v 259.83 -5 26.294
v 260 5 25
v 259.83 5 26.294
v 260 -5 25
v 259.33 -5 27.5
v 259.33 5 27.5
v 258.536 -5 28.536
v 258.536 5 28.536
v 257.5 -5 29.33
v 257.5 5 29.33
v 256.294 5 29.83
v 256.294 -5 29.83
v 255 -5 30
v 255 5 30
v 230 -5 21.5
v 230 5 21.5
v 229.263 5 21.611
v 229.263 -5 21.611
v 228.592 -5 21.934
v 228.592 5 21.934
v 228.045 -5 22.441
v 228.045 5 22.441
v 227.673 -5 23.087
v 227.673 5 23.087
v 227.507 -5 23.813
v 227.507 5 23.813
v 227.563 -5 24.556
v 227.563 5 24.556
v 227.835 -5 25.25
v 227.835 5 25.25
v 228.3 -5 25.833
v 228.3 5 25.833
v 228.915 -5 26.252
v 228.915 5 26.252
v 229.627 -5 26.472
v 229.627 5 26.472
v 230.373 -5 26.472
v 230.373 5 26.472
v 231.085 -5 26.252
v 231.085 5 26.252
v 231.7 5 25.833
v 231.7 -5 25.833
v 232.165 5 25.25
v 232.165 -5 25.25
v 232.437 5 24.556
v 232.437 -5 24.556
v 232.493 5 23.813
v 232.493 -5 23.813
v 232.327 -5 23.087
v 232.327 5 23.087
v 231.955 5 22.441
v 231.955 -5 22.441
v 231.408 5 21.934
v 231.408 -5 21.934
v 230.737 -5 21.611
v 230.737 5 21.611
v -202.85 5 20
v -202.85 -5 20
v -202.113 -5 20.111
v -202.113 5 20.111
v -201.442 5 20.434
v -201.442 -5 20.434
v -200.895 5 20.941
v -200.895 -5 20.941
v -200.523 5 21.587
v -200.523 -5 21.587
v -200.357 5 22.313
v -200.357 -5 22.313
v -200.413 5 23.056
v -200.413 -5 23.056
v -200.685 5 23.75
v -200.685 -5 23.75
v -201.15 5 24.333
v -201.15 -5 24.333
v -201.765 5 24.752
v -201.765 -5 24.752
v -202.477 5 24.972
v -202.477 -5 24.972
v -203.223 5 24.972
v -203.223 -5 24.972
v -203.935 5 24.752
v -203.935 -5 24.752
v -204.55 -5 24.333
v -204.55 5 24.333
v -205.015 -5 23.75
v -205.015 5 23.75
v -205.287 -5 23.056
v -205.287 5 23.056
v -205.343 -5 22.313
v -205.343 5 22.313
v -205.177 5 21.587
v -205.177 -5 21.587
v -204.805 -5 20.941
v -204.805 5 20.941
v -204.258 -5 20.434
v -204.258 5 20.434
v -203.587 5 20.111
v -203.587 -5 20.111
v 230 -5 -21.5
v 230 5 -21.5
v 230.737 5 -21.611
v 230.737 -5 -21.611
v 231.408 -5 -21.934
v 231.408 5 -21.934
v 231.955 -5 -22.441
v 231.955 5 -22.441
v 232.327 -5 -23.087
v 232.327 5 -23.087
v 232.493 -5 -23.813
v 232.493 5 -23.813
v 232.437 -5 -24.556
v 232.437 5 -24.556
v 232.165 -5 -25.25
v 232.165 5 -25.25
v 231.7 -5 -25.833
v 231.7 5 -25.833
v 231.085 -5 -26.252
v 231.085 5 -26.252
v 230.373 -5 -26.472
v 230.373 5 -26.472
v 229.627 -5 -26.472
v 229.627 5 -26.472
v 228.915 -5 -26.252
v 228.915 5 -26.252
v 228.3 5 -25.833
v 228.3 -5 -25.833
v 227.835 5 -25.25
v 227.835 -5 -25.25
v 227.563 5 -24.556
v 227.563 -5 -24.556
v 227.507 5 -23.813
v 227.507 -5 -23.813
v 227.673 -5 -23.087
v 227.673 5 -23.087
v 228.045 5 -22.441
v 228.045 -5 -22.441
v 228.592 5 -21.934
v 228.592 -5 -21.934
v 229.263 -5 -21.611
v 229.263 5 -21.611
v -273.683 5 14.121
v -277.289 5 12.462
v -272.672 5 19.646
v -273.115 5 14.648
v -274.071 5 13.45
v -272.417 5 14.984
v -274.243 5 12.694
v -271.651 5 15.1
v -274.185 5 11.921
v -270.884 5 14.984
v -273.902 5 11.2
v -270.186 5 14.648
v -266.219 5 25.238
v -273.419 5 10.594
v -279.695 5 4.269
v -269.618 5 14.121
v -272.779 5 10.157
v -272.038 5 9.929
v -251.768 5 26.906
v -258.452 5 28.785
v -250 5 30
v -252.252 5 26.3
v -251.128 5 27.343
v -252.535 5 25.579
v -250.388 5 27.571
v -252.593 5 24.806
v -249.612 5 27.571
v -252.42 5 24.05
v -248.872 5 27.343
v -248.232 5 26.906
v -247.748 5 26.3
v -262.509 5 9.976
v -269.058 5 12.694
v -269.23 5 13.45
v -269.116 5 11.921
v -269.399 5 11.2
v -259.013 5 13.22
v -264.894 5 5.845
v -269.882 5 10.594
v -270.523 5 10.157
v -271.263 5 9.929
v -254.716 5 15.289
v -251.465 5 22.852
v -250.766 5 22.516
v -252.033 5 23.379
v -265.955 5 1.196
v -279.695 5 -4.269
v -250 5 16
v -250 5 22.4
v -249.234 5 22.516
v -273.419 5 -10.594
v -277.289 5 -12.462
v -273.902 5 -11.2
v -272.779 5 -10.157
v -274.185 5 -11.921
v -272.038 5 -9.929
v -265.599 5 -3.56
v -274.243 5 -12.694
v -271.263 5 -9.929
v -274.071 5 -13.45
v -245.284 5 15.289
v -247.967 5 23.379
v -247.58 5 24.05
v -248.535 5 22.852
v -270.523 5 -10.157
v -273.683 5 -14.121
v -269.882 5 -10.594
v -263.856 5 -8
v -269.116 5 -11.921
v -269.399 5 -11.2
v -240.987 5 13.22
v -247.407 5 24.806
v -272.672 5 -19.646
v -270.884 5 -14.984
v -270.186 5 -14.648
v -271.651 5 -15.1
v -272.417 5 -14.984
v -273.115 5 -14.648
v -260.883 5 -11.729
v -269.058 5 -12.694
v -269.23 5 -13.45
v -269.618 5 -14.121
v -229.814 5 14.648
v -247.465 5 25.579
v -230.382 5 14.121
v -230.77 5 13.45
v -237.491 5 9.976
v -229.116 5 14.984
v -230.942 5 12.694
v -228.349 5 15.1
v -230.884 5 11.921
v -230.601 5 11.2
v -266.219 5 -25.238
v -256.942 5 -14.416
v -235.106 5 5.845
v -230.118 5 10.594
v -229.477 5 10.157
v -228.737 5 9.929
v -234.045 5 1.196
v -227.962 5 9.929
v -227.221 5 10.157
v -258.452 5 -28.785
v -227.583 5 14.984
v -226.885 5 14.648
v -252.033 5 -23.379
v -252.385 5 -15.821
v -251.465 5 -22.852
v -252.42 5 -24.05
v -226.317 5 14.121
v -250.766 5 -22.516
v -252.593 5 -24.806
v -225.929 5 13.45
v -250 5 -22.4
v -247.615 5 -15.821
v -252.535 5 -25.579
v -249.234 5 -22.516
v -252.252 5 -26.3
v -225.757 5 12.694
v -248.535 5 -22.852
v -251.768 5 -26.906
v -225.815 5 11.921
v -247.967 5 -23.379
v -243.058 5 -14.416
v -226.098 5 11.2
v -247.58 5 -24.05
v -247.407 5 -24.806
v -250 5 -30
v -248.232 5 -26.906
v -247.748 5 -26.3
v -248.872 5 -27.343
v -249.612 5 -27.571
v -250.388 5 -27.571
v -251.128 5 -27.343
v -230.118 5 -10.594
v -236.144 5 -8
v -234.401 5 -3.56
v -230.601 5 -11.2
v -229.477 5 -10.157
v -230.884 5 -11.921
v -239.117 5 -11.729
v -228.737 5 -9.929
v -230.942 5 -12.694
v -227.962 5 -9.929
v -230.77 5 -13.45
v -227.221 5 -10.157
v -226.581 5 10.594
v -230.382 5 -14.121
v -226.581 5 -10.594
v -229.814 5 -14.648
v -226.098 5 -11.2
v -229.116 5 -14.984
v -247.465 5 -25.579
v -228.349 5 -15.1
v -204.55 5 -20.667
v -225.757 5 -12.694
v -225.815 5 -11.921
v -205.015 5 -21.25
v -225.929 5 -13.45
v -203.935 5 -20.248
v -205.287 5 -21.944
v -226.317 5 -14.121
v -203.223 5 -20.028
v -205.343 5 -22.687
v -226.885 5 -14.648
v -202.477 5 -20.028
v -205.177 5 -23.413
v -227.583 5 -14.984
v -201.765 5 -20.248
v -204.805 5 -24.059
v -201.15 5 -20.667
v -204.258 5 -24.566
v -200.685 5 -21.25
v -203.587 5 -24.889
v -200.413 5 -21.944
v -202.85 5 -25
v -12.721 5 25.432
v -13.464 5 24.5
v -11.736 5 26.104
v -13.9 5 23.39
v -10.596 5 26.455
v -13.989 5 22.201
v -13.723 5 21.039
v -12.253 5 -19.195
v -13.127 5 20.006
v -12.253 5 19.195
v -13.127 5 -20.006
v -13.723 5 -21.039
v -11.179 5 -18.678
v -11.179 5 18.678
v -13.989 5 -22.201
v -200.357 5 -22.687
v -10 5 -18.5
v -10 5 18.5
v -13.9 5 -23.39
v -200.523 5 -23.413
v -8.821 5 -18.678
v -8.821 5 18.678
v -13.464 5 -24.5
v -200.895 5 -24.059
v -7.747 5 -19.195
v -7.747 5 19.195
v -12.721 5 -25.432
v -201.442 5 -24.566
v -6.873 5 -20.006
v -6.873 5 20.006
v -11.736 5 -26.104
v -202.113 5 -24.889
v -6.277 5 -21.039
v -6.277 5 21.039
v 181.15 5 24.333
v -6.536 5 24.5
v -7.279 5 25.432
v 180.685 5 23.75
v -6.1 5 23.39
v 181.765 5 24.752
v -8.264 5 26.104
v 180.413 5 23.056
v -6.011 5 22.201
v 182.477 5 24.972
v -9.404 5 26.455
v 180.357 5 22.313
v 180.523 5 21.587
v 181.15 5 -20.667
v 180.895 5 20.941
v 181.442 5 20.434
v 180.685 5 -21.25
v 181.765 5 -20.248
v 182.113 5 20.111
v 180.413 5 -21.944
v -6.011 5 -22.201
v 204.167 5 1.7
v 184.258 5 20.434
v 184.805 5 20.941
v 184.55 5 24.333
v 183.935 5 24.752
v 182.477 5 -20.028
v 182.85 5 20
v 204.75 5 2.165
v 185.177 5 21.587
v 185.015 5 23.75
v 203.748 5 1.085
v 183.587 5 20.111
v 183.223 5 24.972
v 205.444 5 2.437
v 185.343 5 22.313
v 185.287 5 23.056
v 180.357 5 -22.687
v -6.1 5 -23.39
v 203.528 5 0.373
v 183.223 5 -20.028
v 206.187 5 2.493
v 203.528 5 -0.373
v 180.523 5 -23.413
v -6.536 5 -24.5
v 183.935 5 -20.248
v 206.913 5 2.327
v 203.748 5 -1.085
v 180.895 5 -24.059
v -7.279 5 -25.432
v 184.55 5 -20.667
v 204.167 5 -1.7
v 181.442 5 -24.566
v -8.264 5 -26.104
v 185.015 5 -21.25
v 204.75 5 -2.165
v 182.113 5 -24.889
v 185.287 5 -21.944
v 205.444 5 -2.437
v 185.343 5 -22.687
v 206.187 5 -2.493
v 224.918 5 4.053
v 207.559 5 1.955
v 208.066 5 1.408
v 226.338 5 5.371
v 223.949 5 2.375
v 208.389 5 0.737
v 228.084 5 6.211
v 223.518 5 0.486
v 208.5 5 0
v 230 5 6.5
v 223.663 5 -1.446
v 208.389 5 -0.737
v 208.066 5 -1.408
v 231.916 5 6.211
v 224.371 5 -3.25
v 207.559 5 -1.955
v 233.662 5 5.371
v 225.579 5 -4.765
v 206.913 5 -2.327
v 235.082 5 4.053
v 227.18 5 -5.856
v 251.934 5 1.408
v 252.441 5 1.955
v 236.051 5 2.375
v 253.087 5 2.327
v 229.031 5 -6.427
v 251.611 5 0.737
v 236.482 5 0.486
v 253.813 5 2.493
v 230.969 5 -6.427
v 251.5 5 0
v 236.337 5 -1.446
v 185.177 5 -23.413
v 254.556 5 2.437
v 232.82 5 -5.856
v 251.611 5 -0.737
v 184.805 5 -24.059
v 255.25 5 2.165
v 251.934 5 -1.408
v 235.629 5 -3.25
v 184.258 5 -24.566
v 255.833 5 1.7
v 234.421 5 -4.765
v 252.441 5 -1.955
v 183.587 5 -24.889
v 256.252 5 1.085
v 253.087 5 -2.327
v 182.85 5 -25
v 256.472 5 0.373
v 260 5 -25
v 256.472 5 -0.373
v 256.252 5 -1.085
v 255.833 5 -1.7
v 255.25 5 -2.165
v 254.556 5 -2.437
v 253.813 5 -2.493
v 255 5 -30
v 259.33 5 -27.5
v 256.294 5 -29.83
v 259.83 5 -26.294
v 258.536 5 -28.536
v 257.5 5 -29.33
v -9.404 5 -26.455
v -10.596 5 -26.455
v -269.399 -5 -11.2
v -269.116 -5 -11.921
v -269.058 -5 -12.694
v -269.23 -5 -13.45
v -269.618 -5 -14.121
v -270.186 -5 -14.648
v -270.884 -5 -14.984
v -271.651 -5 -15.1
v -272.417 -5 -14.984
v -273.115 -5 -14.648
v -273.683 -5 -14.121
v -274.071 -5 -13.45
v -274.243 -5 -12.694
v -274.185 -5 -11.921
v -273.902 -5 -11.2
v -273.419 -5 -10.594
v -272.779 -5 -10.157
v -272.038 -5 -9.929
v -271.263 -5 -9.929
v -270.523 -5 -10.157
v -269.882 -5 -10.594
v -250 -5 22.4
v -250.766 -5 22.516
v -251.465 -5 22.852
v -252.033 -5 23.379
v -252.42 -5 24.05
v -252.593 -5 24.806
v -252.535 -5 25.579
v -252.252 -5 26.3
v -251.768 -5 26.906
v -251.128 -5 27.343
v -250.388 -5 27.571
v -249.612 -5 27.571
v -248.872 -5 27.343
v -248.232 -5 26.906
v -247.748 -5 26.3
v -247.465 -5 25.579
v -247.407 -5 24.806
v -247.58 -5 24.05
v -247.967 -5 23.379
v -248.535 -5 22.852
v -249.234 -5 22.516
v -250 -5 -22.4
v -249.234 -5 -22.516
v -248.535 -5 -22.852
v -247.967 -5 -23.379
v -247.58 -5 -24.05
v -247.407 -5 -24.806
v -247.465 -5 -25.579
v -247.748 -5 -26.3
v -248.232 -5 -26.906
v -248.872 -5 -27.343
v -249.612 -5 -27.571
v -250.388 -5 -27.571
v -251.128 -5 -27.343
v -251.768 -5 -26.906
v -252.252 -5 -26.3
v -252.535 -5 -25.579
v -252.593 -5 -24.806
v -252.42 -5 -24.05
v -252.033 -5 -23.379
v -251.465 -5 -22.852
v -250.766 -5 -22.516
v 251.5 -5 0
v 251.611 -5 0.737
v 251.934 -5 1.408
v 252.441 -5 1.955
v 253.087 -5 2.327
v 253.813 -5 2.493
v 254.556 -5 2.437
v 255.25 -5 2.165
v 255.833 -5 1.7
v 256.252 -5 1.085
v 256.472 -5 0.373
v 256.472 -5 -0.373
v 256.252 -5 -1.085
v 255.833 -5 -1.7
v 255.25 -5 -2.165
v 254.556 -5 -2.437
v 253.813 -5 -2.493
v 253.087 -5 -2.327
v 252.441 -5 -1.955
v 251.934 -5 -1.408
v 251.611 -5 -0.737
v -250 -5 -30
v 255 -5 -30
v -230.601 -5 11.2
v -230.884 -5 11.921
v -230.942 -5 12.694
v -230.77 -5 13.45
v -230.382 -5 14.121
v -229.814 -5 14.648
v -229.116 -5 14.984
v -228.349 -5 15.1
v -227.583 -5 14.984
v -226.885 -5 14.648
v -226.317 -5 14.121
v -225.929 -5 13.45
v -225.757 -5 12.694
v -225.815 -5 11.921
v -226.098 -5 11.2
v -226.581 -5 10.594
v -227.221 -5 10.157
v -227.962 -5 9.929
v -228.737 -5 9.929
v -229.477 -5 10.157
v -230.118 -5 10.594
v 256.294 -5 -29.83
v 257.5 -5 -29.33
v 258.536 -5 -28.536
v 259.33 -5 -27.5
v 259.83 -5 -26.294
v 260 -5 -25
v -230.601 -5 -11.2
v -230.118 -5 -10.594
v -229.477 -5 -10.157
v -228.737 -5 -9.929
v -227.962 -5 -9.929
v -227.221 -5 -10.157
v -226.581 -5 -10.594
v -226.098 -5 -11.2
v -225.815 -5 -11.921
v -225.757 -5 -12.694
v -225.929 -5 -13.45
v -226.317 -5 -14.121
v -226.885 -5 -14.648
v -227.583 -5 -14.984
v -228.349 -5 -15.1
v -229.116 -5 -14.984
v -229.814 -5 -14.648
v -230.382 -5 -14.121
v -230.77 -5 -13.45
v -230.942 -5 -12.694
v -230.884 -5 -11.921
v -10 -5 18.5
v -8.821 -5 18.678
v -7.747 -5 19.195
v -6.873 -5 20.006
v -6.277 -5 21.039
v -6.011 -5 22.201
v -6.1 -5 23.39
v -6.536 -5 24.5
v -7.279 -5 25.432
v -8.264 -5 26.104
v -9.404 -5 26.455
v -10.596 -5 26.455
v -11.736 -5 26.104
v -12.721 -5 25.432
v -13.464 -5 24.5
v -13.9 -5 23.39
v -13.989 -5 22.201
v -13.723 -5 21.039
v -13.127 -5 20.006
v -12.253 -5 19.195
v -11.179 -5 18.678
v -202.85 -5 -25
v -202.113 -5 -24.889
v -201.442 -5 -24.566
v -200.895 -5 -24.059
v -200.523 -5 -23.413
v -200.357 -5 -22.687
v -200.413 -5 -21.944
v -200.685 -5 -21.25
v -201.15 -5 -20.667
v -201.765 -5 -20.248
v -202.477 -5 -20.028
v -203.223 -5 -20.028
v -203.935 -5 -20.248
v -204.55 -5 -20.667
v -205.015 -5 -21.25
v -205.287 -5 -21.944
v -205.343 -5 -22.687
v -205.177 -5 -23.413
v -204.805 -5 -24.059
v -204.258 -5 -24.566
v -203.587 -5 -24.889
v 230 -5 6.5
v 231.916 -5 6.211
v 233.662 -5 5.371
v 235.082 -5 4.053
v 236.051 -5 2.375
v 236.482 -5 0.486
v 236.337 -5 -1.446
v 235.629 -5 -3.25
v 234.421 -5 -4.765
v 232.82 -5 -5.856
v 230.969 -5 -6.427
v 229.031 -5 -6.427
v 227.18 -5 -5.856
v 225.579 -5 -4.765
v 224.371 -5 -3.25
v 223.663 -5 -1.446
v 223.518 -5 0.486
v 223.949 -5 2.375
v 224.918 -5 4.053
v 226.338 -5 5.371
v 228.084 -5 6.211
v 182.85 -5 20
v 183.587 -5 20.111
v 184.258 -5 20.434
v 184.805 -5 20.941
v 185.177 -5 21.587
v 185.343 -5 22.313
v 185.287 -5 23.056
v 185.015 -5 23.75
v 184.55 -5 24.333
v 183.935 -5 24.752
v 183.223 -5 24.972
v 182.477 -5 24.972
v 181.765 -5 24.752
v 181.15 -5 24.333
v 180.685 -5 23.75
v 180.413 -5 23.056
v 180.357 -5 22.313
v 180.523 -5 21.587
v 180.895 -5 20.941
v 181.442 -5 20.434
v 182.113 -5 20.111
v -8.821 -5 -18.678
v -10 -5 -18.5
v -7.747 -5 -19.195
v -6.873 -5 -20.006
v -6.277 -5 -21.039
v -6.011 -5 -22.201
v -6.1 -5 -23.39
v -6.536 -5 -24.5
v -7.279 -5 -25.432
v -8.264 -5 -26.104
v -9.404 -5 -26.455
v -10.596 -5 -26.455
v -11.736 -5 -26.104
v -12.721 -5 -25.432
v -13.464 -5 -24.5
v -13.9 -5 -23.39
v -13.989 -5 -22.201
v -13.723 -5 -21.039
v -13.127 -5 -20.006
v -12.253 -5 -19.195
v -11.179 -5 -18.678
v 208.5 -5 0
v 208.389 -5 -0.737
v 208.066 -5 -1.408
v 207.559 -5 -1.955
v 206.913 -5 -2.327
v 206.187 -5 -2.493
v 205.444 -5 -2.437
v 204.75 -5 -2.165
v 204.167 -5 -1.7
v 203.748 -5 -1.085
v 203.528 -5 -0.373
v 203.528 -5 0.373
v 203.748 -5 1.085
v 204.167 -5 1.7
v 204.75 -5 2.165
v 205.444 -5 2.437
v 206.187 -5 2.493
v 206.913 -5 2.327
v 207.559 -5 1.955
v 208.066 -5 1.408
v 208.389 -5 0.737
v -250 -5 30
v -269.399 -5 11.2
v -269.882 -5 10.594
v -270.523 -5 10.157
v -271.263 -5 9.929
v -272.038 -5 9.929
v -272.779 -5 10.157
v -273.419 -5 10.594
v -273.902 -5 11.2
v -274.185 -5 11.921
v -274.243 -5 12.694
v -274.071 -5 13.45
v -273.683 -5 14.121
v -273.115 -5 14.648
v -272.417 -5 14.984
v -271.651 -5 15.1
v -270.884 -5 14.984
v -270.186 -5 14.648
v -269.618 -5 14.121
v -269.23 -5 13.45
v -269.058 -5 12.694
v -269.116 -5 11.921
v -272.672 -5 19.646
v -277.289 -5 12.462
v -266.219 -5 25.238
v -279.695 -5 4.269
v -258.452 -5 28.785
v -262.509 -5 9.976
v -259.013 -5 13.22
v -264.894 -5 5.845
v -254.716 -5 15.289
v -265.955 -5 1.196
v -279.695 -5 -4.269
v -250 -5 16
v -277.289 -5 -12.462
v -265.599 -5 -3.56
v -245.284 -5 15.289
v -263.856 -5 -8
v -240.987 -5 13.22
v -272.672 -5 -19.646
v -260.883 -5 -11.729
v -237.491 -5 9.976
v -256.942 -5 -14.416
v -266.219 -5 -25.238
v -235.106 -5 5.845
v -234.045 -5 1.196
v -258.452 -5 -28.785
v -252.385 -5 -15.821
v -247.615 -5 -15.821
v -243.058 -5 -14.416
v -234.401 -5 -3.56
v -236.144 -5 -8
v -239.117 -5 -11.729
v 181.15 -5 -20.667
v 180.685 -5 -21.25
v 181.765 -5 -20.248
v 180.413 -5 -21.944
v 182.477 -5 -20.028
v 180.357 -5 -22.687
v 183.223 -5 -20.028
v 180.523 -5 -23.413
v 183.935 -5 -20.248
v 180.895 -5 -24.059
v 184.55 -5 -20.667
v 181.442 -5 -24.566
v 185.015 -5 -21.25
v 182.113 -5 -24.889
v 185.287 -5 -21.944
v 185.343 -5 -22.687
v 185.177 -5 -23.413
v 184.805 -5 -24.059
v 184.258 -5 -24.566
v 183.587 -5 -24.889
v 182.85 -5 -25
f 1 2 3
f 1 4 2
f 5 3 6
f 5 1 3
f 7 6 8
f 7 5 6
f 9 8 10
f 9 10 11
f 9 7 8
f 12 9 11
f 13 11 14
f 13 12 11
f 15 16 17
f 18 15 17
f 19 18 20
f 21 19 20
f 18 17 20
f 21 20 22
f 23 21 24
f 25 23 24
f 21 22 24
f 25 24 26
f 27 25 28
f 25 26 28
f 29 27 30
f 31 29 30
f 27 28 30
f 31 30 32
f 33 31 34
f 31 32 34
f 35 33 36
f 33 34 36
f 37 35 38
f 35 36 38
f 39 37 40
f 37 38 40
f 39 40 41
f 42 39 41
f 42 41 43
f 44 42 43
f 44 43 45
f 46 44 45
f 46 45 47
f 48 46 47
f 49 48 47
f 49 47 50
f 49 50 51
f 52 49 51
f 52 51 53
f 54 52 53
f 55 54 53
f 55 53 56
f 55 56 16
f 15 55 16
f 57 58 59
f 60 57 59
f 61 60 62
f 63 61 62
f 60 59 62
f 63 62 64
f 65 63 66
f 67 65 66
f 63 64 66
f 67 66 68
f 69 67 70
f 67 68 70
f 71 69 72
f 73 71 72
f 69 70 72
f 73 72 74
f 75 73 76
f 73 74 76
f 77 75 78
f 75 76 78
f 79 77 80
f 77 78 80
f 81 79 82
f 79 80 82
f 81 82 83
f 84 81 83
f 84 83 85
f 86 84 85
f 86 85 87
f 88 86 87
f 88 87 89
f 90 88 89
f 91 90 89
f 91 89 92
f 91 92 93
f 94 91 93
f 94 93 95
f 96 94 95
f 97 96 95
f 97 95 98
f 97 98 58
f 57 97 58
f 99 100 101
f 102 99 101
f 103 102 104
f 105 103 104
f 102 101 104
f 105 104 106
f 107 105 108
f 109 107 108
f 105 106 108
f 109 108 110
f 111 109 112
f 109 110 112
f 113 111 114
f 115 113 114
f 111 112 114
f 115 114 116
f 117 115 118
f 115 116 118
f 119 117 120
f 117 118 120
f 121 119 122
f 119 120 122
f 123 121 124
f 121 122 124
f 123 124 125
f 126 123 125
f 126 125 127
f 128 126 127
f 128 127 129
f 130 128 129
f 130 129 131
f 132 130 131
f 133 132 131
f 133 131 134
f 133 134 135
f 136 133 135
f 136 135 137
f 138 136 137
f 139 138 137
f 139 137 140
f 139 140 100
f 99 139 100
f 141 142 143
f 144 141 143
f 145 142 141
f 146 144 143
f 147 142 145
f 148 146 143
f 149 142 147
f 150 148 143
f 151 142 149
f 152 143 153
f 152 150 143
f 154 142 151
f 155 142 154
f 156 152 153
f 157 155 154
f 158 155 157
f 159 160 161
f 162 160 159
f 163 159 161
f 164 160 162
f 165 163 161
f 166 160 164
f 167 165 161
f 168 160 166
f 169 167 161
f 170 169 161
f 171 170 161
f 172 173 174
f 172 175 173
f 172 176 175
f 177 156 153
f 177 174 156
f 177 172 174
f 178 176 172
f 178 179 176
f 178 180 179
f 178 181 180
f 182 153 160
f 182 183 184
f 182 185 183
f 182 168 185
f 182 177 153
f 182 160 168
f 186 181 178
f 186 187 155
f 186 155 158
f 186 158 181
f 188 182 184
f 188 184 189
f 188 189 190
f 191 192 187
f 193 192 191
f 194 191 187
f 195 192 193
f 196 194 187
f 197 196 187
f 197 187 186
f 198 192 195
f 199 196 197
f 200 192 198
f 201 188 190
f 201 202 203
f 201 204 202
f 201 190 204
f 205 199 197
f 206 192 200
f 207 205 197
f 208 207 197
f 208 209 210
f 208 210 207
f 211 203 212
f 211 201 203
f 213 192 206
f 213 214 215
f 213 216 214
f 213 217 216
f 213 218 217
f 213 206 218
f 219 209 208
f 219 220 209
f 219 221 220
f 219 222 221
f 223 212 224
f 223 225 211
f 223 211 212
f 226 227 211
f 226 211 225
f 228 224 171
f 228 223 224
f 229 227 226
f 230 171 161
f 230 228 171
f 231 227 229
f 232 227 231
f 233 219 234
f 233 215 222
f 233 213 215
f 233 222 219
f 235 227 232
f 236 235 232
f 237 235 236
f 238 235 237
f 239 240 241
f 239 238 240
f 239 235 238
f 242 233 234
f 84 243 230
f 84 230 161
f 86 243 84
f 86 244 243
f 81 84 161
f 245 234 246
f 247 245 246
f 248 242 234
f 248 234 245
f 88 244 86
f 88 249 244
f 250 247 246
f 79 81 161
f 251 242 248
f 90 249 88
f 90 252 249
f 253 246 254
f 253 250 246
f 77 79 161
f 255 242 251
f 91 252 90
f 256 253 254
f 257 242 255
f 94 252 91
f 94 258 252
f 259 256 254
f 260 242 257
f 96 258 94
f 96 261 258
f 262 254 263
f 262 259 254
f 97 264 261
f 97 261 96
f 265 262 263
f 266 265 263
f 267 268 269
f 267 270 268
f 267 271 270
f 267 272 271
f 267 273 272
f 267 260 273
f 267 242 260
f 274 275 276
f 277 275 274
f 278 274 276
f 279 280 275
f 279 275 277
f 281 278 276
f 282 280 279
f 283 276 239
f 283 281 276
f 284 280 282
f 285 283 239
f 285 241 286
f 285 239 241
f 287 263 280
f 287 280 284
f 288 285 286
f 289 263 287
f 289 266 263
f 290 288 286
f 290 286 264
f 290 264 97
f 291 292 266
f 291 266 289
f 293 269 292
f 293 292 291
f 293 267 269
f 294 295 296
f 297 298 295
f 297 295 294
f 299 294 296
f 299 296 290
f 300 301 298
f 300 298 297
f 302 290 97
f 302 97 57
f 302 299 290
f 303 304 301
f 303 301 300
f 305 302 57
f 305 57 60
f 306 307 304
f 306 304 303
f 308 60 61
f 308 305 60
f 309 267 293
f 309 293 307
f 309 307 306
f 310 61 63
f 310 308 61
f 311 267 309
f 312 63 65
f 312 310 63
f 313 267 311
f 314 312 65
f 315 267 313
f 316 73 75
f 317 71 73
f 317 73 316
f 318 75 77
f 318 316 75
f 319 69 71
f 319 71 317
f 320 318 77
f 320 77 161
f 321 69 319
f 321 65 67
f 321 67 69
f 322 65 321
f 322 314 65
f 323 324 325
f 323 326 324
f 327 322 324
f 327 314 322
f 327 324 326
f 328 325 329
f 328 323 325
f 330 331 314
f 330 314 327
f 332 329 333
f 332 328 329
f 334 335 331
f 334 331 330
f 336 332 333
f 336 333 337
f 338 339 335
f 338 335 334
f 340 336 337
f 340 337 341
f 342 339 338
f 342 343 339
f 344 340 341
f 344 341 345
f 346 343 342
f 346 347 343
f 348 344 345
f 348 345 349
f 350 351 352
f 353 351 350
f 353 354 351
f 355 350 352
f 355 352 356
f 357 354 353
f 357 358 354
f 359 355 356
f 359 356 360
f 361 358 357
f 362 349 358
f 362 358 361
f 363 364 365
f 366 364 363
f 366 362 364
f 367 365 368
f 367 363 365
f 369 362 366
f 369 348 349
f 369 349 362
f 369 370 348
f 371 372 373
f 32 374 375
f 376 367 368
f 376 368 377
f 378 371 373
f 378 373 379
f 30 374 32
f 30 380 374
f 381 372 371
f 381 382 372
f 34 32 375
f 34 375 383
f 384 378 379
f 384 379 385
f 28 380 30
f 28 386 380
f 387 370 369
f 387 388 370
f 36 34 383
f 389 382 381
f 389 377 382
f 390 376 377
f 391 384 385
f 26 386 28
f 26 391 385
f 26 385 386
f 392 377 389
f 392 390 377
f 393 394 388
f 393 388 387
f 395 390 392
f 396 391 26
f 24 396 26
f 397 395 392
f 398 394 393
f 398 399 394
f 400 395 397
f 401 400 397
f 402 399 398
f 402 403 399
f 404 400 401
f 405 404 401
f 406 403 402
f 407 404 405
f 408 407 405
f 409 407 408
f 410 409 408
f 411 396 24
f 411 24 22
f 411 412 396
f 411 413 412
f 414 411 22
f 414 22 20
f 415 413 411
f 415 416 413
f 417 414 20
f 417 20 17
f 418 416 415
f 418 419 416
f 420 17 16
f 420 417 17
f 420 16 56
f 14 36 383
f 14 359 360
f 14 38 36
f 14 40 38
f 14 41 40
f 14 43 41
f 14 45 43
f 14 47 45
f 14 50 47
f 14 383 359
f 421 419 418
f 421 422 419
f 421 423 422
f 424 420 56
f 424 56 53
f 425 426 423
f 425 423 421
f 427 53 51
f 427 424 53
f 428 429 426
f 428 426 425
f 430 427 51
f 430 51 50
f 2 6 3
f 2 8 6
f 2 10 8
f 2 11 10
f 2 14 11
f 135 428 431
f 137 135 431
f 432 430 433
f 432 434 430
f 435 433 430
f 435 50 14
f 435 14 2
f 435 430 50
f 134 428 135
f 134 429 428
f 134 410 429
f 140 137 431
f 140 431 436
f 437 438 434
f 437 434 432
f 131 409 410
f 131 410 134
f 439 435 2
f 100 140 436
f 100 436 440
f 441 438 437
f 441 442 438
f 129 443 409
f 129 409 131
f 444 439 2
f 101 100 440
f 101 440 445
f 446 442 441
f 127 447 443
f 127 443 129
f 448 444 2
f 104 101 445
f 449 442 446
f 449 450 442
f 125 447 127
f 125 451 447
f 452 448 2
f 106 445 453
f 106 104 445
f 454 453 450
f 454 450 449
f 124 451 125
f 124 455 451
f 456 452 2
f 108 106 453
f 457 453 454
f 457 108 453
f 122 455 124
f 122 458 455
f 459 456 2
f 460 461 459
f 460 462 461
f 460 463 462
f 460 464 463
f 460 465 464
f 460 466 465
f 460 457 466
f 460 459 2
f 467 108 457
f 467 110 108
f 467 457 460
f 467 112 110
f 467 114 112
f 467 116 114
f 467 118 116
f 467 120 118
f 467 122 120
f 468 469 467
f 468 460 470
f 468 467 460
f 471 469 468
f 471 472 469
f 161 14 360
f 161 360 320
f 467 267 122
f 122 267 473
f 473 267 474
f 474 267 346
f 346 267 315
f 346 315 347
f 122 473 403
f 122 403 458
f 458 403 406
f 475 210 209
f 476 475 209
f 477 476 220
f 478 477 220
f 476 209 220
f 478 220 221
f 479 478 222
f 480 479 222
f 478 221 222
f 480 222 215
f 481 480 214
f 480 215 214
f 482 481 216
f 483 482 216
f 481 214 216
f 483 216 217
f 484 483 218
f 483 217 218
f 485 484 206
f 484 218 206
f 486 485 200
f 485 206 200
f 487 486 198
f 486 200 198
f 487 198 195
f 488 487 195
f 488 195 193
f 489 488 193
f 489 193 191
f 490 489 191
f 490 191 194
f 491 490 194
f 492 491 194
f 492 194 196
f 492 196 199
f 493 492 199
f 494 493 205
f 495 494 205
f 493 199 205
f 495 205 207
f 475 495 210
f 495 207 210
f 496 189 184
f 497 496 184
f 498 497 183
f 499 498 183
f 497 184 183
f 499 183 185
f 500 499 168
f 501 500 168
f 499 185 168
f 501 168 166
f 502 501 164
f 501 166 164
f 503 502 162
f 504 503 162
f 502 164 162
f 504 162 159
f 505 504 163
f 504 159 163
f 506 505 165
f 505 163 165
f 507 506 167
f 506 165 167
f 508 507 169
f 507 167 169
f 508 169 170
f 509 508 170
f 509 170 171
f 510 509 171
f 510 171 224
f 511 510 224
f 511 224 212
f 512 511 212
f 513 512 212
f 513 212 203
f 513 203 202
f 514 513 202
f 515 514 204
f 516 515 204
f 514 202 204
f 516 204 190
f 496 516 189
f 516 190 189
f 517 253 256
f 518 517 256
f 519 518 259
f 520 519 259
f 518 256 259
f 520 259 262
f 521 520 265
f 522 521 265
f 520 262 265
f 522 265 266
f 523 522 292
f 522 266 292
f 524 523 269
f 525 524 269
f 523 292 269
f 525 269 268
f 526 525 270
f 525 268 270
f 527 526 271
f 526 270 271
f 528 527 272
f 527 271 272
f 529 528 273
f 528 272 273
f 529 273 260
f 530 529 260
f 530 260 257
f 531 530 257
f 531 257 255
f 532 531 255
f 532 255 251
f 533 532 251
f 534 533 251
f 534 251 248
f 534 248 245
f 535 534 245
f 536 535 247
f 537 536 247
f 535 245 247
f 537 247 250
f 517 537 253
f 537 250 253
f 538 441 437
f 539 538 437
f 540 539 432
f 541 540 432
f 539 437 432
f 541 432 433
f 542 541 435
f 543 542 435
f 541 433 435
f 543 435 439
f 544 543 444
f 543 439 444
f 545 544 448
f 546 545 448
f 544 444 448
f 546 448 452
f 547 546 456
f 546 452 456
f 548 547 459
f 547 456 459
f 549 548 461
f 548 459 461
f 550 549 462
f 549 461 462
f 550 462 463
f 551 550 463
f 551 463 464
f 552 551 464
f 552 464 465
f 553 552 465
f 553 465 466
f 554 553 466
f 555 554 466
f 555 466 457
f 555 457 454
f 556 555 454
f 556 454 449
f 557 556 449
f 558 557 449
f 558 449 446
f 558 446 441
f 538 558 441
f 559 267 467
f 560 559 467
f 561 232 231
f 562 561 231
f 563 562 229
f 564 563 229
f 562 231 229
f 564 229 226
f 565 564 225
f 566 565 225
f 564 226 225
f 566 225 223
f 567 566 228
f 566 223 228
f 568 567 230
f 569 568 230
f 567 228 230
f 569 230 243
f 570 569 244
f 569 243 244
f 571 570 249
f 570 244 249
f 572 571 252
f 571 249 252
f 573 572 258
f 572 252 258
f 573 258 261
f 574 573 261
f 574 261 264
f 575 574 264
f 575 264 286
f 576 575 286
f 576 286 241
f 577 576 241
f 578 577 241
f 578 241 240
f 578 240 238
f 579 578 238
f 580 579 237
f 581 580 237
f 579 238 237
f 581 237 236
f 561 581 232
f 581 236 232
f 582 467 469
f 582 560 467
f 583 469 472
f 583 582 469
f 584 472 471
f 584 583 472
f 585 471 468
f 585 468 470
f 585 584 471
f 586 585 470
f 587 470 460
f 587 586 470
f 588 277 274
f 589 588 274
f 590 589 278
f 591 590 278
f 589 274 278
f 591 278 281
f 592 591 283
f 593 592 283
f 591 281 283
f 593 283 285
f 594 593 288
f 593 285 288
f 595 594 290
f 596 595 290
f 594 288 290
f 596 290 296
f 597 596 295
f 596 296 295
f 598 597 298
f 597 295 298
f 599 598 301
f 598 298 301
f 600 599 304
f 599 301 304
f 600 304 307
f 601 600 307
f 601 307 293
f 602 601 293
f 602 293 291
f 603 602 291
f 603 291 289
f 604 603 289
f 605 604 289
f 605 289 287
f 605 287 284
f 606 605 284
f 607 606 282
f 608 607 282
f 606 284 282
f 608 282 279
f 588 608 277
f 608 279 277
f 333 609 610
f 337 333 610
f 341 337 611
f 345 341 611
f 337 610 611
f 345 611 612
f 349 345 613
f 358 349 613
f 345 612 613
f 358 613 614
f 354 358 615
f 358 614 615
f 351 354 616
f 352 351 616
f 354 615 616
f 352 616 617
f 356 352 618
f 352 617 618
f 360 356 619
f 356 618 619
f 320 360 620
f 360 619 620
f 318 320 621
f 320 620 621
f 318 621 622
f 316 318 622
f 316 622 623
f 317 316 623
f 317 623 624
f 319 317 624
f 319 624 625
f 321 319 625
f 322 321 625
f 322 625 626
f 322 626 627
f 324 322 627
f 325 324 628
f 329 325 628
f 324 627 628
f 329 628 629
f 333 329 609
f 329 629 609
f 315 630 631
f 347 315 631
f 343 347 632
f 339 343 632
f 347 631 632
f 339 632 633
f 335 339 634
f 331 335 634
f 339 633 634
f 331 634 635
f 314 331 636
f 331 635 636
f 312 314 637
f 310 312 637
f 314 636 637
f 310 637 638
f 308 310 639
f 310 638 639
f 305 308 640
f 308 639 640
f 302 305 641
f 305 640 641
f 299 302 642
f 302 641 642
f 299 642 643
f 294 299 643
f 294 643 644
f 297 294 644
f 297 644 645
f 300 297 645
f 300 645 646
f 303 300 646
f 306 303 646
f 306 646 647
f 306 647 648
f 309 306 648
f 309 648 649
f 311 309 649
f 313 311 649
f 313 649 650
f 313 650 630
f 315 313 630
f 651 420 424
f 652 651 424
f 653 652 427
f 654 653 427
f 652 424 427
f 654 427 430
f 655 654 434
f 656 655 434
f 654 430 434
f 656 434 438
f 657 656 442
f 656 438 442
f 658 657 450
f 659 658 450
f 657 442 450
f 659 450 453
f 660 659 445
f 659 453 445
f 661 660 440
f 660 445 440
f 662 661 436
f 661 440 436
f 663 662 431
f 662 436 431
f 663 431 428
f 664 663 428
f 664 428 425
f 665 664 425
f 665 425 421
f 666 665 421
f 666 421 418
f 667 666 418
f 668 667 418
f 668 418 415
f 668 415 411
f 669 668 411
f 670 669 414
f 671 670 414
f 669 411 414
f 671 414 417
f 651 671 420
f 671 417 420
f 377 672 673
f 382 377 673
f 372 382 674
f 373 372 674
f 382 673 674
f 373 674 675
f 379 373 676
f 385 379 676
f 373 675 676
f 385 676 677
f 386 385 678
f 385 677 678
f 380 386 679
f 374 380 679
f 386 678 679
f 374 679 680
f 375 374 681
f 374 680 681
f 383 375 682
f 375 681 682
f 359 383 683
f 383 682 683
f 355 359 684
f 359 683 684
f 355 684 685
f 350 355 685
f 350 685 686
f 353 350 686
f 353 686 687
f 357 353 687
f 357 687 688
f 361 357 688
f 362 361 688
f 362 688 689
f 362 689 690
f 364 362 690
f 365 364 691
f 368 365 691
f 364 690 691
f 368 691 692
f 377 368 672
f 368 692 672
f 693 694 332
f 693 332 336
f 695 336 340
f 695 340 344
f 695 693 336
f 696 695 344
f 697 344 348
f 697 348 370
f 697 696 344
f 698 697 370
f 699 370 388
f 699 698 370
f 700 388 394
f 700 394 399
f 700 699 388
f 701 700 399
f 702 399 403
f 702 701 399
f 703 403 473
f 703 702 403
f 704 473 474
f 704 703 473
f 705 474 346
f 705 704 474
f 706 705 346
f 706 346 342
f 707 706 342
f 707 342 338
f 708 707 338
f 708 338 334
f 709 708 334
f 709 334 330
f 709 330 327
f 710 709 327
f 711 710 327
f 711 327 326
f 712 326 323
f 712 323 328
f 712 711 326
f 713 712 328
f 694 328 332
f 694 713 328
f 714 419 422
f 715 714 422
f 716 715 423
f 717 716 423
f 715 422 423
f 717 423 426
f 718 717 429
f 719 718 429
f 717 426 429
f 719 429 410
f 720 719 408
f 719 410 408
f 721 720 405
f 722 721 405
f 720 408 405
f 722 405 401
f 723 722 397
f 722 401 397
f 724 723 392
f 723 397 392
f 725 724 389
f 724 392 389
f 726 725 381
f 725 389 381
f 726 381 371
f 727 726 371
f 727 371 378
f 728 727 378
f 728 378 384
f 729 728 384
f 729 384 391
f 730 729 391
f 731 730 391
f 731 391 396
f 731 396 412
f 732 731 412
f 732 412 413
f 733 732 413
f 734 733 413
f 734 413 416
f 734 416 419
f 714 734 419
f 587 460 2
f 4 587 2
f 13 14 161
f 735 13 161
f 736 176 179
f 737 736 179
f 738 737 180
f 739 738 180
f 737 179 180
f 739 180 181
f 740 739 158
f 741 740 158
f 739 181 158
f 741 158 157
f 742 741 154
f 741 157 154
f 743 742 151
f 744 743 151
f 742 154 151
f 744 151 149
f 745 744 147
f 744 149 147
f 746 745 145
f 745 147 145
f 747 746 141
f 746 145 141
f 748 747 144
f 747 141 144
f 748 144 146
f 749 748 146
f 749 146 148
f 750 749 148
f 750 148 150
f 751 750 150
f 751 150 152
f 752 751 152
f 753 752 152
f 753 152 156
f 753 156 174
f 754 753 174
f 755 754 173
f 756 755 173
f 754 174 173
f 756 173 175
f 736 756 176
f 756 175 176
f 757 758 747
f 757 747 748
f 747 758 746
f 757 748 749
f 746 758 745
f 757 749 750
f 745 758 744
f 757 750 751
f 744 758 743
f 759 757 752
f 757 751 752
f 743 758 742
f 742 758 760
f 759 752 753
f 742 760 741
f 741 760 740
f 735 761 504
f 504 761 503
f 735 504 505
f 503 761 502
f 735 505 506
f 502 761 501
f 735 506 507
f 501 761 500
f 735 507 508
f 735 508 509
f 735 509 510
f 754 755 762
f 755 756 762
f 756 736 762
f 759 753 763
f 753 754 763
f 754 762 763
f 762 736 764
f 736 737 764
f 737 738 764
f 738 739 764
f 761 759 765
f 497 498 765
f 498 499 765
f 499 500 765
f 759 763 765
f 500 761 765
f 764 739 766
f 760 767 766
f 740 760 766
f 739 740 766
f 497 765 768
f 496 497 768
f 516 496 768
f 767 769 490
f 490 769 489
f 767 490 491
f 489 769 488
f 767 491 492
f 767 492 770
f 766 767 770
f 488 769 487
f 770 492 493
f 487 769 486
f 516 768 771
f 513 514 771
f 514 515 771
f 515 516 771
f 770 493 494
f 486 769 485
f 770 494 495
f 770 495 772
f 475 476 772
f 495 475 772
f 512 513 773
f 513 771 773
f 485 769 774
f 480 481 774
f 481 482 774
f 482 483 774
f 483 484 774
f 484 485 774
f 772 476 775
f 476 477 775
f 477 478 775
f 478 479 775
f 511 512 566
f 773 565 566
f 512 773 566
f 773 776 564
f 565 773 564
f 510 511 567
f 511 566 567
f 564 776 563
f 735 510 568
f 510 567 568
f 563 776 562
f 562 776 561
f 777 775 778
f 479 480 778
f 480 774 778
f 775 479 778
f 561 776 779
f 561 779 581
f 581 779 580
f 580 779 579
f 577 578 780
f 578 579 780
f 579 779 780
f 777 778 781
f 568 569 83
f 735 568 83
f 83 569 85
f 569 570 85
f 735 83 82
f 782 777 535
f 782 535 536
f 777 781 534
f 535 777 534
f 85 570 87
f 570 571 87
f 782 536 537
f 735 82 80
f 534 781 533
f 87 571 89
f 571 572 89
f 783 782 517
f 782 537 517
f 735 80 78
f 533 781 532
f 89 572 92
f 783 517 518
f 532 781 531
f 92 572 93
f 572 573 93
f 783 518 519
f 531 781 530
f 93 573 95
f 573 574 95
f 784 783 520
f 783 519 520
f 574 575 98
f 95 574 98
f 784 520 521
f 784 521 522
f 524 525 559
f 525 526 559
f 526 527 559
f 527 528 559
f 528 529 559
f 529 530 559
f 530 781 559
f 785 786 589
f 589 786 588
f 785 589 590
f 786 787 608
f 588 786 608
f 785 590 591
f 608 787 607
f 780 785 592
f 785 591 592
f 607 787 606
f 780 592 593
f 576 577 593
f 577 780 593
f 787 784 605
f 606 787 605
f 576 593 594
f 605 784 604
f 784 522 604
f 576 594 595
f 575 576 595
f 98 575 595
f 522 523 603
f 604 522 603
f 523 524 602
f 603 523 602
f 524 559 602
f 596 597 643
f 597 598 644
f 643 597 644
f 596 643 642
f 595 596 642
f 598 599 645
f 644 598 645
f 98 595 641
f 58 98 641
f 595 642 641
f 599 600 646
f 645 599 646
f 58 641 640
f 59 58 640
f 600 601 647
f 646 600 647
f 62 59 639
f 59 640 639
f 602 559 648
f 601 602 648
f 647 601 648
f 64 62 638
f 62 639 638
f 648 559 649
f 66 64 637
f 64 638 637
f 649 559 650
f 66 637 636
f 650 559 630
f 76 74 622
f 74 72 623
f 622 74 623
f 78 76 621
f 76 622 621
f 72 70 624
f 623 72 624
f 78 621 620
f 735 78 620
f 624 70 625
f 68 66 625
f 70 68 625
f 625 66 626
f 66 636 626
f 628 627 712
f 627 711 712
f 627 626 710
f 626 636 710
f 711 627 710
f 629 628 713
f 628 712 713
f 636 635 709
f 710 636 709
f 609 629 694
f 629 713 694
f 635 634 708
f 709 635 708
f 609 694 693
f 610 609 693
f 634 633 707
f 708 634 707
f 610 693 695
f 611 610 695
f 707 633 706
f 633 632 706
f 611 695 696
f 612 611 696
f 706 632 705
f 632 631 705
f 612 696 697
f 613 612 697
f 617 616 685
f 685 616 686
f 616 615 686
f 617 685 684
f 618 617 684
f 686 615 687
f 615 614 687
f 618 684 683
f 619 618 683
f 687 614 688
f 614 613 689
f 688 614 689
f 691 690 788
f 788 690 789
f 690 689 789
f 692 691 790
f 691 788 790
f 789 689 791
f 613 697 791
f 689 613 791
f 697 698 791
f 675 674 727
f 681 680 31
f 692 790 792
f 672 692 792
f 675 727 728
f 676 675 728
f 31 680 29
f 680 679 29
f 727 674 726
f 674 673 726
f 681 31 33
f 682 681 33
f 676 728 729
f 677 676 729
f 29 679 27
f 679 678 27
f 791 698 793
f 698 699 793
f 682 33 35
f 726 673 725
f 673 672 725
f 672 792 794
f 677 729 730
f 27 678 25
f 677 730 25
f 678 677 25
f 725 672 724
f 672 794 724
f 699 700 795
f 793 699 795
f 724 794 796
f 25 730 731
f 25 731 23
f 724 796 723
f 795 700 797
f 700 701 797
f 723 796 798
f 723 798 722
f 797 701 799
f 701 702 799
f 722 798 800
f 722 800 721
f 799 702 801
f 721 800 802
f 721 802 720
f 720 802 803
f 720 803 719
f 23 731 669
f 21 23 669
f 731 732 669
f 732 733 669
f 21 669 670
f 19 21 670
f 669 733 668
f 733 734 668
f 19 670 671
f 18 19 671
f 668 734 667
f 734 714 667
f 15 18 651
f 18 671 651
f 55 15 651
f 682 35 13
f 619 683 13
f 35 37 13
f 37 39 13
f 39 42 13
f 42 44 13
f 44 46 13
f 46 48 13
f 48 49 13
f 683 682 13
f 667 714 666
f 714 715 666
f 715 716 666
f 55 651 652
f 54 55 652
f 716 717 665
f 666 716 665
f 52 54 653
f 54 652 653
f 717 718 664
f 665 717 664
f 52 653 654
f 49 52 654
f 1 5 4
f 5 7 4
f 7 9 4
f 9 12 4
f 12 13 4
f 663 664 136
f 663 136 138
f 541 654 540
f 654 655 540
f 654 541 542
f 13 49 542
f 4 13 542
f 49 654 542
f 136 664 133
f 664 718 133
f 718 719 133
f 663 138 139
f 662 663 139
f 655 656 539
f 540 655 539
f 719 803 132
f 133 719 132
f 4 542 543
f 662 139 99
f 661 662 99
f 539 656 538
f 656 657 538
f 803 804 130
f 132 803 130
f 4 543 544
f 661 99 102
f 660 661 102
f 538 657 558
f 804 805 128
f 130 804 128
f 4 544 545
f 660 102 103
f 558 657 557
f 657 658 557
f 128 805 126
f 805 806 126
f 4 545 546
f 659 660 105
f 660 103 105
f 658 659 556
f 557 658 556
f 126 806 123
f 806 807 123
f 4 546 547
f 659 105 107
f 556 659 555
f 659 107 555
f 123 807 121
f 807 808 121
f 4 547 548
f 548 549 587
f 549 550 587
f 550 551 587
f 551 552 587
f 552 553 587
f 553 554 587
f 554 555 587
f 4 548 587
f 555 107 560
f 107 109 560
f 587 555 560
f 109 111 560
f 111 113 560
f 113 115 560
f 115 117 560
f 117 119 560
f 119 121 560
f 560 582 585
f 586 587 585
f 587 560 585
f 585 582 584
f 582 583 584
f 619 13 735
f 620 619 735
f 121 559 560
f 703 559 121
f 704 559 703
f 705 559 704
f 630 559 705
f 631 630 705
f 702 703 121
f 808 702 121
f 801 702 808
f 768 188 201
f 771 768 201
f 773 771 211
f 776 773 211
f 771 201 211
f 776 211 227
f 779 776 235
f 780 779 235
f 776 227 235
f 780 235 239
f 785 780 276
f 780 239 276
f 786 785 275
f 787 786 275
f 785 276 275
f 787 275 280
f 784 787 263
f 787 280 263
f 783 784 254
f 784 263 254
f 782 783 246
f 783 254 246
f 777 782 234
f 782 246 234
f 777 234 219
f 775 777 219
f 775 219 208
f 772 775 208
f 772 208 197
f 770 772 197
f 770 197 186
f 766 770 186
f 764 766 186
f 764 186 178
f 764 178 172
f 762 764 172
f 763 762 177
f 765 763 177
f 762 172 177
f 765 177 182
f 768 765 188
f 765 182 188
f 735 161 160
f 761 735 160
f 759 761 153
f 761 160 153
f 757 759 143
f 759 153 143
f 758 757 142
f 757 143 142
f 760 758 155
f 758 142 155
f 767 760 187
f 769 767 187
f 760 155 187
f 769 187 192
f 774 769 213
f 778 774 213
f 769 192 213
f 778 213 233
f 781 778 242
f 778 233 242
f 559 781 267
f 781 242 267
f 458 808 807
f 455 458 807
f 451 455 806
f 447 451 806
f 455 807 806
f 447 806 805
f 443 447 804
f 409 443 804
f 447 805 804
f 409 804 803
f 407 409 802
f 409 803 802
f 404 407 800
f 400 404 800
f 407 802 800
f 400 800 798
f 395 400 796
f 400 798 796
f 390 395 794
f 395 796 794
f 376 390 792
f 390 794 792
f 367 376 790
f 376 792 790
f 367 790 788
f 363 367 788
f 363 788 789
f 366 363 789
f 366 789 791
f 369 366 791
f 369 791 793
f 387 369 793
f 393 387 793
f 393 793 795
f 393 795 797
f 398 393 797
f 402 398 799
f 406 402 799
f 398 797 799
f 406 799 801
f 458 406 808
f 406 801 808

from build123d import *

# Parameters (mm, degrees)
SALIENTE_EXTRUIR1_DEPTH = 5
CROQUIS2_R              = 16
CORTAR_EXTRUIR1_DEPTH   = 10
CROQUIS4_R              = 2.6
CORTAR_EXTRUIR2_DEPTH   = 10
MATRIZC1_COUNT          = 6
REDONDEO1_R             = 10
CROQUIS5_R              = 16
CORTAR_EXTRUIR3_DEPTH   = 282.780056072
CORTAR_EXTRUIR4_DEPTH   = 282.780056072
REDONDEO2_R             = 5
CROQUIS7_R              = 2.5
CORTAR_EXTRUIR5_DEPTH   = 10
CROQUIS8_R              = 2.5
CORTAR_EXTRUIR6_DEPTH   = 282.780056072
SKETCH1_R               = 4
CUT_EXTRUDE1_DEPTH      = 10
SKETCH2_R               = 2.5
CUT_EXTRUDE2_DEPTH      = 282.780056072
CIRPATTERN1_COUNT       = 4
SKETCH3_R               = 16
SKETCH3_R_2             = 6.5
BOSS_EXTRUDE1_DEPTH     = 10


with BuildPart() as part:
    # Croquis1 → Saliente-Extruir1 (new, symmetric)
    with BuildSketch(Plane(origin=(0, 0, 0), x_dir=(1, 0, 0), z_dir=(0, 1, 0))):
        with BuildLine():
            Line((-250, 30), (250, 30))
            Line((250, 30), (280, 30))
            Line((280, 30), (280, 0))
            Line((280, 0), (280, -30))
            Line((280, -30), (250, -30))
            Line((250, -30), (-250, -30))
            ThreePointArc((-250, -30), (-280, 0), (-250, 30))
        make_face()
    extrude(amount=SALIENTE_EXTRUIR1_DEPTH, both=True)

    # Croquis2 → Cortar-Extruir1 (cut)
    with BuildSketch(Plane(origin=(0, 5, 0), x_dir=(1, 0, 0), z_dir=(0, 1, 0))):
        with Locations(Location((-250, 0, 0), (0, 0, 270))):
            Circle(CROQUIS2_R)
    extrude(amount=-CORTAR_EXTRUIR1_DEPTH, mode=Mode.SUBTRACT)

    # Croquis4 → Cortar-Extruir2 (cut)
    with BuildSketch(Plane(origin=(0, 5, 0), x_dir=(1, 0, 0), z_dir=(0, 1, 0))):
        with Locations(Location((-250, 25, 0), (0, 0, 270))):
            Circle(CROQUIS4_R)
    cortar_extruir2 = extrude(amount=-CORTAR_EXTRUIR2_DEPTH, mode=Mode.SUBTRACT)

    # MatrizC1: Cortar-Extruir2 ×6 about axis
    matrizc1_axis = Axis((-250, 0, 0), (0, 1, 0))
    for i in range(1, MATRIZC1_COUNT):
        add(cortar_extruir2.rotate(matrizc1_axis, i * 360 / MATRIZC1_COUNT), mode=Mode.SUBTRACT)

    # Redondeo1
    redondeo1_edges = [part.edges().sort_by_distance(p)[0] for p in [
        (280, 0, -30),
        (280, 0, 30),
    ]]
    fillet(redondeo1_edges, radius=REDONDEO1_R)

    # Croquis5 → Cortar-Extruir3 (cut, through all)
    with BuildSketch(Plane(origin=(0, 5, 0), x_dir=(1, 0, 0), z_dir=(0, 1, 0))):
        with Locations(Location((230, 0, 0), (0, 0, 270))):
            Circle(CROQUIS5_R)
    extrude(amount=-CORTAR_EXTRUIR3_DEPTH, mode=Mode.SUBTRACT)

    # Croquis6 → Cortar-Extruir4 (cut, through all)
    with BuildSketch(Plane(origin=(0, 5, 0), x_dir=(1, 0, 0), z_dir=(0, 1, 0))):
        with BuildLine():
            Line((260, 30), (260, -30))
            Line((260, -30), (270, -30))
            ThreePointArc((270, -30), (277.071067812, -27.071067812), (280, -20))
            Line((280, -20), (280, 20))
            ThreePointArc((280, 20), (277.071067812, 27.071067812), (270, 30))
            Line((270, 30), (260, 30))
        make_face()
    extrude(amount=-CORTAR_EXTRUIR4_DEPTH, mode=Mode.SUBTRACT)

    # Redondeo2
    redondeo2_edges = [part.edges().sort_by_distance(p)[0] for p in [
        (260, 0, 30),
        (260, 0, -30),
    ]]
    fillet(redondeo2_edges, radius=REDONDEO2_R)

    # Croquis7 → Cortar-Extruir5 (cut)
    with BuildSketch(Plane.XZ.offset(5)):
        with Locations(Location((182.85, -22.5, 0), (0, 0, 270))):
            Circle(CROQUIS7_R)
        with Locations(Location((182.85, 22.5, 0), (0, 0, 270))):
            Circle(CROQUIS7_R)
    extrude(amount=-CORTAR_EXTRUIR5_DEPTH, mode=Mode.SUBTRACT)

    # Croquis8 → Cortar-Extruir6 (cut, through all)
    with BuildSketch(Plane.XZ.offset(5)):
        with Locations(Location((-202.85, -22.5, 0), (0, 0, 270))):
            Circle(CROQUIS8_R)
        with Locations(Location((-202.85, 22.5, 0), (0, 0, 270))):
            Circle(CROQUIS8_R)
    extrude(amount=-CORTAR_EXTRUIR6_DEPTH, mode=Mode.SUBTRACT)

    # Sketch1 → Cut-Extrude1 (cut)
    with BuildSketch(Plane(origin=(0, -5, 0), x_dir=(-1, 0, 0), z_dir=(0, -1, 0))):
        with Locations(Location((10, -22.5, 0), (0, 0, 90))):
            Circle(SKETCH1_R)
    cut_extrude1 = extrude(amount=-CUT_EXTRUDE1_DEPTH, mode=Mode.SUBTRACT)

    # Mirror1: Cut-Extrude1 across plane
    add(cut_extrude1.mirror(Plane.XY), mode=Mode.SUBTRACT)

    # Sketch2 → Cut-Extrude2 (cut, through all)
    with BuildSketch(Plane(origin=(0, 5, 0), x_dir=(1, 0, 0), z_dir=(0, 1, 0))):
        with Locations(Location((230, 24, 0), (0, 0, 270))):
            Circle(SKETCH2_R)
    cut_extrude2 = extrude(amount=-CUT_EXTRUDE2_DEPTH, mode=Mode.SUBTRACT)

    # CirPattern1: Cut-Extrude2 ×4 about axis
    cirpattern1_axis = Axis((230, 0, 0), (0, 1, 0))
    for i in range(1, CIRPATTERN1_COUNT):
        add(cut_extrude2.rotate(cirpattern1_axis, i * 360 / CIRPATTERN1_COUNT), mode=Mode.SUBTRACT)

    # Sketch3 → Boss-Extrude1 (add)
    with BuildSketch(Plane(origin=(0, 5, 0), x_dir=(1, 0, 0), z_dir=(0, 1, 0))):
        with Locations((230, 0)):
            Circle(SKETCH3_R)
        with Locations(Location((230, 0, 0), (0, 0, 270))):
            Circle(SKETCH3_R_2, mode=Mode.SUBTRACT)
    extrude(amount=-BOSS_EXTRUDE1_DEPTH)


solid = part.part
